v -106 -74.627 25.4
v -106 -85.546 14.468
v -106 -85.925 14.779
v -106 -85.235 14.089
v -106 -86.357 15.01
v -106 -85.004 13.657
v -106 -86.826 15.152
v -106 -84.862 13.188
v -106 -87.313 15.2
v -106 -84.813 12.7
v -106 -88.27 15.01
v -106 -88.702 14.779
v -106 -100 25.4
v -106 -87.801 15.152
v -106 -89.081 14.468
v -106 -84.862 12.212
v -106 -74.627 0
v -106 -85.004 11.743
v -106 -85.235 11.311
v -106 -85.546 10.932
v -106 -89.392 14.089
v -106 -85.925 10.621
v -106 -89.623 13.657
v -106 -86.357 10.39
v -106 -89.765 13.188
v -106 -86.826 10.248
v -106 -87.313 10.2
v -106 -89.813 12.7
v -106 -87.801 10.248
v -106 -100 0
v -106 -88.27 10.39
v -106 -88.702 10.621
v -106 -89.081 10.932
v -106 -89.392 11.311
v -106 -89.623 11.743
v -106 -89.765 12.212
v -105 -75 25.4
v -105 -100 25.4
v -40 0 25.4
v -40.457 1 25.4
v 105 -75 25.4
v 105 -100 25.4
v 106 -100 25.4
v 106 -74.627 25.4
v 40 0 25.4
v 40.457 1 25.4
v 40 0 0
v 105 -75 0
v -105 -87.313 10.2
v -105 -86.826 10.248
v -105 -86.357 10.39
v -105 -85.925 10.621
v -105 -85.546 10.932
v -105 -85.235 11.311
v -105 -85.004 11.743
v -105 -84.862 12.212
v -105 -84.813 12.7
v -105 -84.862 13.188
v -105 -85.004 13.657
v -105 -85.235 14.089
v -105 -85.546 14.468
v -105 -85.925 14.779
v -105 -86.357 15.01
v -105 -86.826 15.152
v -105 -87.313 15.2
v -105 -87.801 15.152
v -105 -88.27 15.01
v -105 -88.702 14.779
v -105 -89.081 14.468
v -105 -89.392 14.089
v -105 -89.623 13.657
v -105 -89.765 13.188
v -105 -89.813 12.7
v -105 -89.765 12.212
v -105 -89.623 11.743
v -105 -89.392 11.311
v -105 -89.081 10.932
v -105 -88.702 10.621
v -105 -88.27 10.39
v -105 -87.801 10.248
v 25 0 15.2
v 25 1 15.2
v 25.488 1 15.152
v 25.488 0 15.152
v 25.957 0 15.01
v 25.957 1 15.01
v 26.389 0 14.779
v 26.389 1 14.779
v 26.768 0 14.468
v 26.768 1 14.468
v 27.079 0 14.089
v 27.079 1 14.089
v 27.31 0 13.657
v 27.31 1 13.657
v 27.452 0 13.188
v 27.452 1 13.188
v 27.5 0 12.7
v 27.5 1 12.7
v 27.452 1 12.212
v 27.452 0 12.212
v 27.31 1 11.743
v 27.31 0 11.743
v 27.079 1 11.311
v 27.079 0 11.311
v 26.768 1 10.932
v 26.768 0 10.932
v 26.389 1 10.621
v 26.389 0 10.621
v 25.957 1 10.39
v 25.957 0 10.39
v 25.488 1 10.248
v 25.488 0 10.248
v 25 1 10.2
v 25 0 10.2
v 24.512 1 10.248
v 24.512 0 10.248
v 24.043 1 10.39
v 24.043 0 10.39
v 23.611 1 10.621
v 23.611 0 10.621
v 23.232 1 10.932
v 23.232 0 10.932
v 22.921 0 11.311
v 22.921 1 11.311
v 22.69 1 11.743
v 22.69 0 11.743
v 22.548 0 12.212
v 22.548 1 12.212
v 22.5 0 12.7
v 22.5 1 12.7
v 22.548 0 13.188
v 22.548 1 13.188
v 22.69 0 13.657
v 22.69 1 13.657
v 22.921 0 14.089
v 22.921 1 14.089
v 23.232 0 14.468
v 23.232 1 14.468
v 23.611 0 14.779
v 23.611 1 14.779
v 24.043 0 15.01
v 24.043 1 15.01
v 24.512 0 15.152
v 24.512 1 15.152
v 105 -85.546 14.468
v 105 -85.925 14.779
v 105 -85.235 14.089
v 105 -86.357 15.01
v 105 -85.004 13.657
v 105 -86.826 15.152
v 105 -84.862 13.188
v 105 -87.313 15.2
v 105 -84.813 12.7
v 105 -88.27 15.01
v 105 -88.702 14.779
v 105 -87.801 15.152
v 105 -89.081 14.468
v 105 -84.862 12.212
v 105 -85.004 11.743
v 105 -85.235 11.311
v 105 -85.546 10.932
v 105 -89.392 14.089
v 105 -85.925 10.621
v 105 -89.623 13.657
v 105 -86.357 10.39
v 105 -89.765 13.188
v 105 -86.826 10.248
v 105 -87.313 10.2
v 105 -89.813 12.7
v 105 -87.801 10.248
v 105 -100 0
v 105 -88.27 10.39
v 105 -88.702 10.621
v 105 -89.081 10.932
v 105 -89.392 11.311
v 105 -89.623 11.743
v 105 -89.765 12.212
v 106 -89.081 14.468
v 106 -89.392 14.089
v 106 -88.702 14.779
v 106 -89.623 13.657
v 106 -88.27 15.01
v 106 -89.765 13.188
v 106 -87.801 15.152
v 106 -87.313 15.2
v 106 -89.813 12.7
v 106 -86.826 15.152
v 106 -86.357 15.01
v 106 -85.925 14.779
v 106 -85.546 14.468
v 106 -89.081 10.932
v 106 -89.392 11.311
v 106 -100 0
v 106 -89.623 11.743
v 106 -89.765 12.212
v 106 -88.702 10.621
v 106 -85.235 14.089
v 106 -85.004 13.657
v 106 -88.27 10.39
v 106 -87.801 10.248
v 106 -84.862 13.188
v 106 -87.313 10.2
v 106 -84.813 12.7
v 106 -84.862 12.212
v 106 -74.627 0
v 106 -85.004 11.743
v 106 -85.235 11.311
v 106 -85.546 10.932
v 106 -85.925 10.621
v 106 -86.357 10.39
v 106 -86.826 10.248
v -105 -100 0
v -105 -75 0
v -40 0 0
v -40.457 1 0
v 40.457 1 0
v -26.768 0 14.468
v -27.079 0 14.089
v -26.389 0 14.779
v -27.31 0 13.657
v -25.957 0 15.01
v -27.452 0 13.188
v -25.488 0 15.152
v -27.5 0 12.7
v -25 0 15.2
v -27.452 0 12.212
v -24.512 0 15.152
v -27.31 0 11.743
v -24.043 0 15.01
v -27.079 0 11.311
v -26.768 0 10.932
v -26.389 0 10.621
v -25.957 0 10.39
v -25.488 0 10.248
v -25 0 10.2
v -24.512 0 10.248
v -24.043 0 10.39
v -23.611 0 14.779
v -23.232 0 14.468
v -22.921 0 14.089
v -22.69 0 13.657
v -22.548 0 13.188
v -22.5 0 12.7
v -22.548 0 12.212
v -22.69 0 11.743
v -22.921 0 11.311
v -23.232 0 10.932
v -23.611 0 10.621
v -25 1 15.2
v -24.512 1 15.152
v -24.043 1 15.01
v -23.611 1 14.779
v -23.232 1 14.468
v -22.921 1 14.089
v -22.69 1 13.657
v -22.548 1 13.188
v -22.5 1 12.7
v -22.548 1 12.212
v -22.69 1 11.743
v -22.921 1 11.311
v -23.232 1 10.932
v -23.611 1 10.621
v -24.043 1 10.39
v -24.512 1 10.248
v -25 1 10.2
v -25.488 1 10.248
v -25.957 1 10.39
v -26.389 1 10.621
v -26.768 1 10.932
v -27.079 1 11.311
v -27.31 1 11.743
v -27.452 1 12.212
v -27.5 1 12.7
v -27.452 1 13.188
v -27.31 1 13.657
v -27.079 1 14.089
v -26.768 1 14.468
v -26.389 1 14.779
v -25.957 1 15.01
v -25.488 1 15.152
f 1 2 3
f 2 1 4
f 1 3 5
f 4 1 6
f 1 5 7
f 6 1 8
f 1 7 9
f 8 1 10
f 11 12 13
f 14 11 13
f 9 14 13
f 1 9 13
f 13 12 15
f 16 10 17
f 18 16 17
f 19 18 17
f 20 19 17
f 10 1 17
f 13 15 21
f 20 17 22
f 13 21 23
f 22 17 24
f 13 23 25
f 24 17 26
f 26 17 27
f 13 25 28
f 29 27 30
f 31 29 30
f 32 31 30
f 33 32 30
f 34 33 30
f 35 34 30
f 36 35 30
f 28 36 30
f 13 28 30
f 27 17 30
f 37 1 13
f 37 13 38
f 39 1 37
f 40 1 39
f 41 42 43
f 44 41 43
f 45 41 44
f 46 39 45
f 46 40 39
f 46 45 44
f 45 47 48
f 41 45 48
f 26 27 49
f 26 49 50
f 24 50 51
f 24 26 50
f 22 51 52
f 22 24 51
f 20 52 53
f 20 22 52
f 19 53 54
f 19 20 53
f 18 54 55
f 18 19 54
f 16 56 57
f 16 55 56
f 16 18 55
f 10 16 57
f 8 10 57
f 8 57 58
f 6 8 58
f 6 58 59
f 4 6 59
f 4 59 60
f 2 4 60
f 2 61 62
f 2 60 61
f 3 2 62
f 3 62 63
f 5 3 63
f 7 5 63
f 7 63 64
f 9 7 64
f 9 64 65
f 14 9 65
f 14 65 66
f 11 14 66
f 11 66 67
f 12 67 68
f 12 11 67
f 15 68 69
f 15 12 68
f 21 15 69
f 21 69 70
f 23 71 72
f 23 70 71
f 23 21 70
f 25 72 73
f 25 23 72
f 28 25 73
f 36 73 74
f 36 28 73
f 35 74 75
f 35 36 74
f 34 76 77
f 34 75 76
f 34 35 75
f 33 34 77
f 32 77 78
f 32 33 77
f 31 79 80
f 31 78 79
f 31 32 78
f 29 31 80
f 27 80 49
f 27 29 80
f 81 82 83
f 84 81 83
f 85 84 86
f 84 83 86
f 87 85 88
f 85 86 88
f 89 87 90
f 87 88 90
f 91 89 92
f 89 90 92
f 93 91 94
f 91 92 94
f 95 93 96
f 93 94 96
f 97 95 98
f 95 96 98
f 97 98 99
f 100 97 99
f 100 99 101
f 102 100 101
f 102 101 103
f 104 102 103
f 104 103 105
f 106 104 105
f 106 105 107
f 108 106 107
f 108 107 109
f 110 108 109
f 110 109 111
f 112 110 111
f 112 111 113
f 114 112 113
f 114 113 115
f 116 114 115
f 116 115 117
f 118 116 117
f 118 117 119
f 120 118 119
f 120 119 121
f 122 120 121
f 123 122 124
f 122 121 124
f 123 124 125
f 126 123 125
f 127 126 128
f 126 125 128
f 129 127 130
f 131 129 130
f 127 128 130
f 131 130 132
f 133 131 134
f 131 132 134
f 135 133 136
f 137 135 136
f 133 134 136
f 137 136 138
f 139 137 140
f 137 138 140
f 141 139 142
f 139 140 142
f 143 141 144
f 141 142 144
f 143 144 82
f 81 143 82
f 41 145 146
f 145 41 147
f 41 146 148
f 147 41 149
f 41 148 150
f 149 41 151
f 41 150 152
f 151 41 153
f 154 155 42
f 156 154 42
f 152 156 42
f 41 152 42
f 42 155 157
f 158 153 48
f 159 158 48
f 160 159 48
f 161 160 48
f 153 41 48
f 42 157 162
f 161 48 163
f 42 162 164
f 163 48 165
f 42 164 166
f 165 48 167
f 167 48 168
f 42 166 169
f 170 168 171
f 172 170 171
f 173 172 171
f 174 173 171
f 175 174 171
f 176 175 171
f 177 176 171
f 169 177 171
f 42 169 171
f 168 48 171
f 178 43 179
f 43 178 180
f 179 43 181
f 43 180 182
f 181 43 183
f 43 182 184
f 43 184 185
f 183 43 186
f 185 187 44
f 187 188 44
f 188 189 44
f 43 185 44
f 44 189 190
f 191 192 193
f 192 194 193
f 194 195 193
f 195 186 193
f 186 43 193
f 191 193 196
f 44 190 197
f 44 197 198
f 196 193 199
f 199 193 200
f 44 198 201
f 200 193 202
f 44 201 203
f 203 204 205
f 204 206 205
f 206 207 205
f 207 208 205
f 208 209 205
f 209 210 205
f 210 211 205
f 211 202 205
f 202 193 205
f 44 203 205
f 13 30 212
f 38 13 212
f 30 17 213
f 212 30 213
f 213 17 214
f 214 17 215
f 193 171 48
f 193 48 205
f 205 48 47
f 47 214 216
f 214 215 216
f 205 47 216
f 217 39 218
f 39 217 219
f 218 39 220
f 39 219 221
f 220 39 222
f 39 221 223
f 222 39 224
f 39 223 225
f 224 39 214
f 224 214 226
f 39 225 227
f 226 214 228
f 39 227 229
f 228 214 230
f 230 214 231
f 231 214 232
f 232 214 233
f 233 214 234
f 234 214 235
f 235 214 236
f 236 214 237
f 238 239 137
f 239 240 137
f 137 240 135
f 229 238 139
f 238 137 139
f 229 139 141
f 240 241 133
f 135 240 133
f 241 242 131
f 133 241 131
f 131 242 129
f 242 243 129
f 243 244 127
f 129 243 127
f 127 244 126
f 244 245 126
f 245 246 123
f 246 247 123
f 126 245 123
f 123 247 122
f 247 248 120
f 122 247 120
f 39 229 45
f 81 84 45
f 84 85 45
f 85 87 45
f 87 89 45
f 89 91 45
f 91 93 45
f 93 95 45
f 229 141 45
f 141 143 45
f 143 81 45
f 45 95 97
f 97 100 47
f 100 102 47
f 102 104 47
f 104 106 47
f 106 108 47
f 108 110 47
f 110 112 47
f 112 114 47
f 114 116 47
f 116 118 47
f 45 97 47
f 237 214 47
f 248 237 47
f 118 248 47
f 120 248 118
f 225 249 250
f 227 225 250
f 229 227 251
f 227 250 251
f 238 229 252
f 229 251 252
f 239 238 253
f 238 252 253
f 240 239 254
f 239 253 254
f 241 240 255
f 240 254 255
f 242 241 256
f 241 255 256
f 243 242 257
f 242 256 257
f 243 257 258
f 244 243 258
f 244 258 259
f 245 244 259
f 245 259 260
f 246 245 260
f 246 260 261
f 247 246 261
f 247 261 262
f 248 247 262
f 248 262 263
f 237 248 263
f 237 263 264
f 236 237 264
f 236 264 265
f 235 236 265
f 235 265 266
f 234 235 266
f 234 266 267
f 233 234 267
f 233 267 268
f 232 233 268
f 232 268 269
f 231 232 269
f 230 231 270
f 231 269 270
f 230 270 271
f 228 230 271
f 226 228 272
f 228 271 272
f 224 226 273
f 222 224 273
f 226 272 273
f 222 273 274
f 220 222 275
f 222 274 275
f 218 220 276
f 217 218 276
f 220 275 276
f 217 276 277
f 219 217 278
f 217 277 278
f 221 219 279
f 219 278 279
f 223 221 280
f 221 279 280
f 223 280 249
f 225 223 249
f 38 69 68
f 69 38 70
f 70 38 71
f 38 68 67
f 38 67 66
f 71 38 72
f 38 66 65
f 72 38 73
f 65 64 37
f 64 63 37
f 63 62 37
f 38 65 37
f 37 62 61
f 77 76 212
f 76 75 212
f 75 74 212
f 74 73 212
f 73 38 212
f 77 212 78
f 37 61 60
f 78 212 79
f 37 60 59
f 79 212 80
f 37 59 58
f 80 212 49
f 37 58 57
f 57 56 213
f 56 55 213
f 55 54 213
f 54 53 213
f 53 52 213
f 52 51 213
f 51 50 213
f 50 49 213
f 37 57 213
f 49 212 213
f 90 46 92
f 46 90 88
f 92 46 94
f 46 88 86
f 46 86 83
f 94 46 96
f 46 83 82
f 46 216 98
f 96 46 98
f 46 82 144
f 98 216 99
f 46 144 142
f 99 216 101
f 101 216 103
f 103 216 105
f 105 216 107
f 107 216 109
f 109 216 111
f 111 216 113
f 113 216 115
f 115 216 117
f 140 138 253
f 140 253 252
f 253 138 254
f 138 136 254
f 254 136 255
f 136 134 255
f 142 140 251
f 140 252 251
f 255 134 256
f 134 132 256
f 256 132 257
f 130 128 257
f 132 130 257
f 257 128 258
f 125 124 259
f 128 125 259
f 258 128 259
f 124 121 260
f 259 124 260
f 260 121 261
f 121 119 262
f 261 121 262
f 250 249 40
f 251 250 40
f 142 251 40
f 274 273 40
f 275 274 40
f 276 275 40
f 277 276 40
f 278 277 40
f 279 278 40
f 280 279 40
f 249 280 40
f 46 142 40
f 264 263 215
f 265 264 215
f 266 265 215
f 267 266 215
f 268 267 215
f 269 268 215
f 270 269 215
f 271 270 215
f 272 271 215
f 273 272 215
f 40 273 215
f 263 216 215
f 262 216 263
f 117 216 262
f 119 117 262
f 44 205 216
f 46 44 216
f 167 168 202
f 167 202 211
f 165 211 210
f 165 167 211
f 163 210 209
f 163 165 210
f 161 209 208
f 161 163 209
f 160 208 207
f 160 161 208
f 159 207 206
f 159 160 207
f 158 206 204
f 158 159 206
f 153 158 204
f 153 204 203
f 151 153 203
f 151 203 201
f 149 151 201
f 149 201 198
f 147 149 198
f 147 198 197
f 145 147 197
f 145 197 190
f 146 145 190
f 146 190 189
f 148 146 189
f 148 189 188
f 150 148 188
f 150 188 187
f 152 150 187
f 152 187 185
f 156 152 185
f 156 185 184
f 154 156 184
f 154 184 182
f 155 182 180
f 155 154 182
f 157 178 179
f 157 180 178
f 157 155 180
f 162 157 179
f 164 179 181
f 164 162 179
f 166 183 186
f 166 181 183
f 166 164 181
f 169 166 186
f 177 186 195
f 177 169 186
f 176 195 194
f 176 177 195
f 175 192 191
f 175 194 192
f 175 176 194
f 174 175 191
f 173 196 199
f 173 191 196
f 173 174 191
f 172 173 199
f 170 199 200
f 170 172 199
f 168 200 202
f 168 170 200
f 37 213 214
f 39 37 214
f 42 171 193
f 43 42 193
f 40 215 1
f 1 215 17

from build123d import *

# Parameters (mm, degrees)
EXTRUDE_THIN1_DEPTH     = 25.4
SKETCH3_R               = 2.5
CUT_EXTRUDE1_DEPTH      = 10
CUT_EXTRUDE2_DEPTH      = 148.922817712
CUT_EXTRUDE2_DEPTH_BACK = 148.922817712
SKETCH4_R               = 2.5


with BuildPart() as part:
    # Sketch2 → Extrude-Thin1 (new body)
    with BuildSketch(Plane.XY):
        Polygon((-105, -100), (-105, -75), (-40, 0), (40, 0), (105, -75), (105, -100), (106, -100), (106, -74.626966674), (40.456628883, 1), (-40.456628883, 1), (-106, -74.626966674), (-106, -100), align=None)
    extrude(amount=EXTRUDE_THIN1_DEPTH)

    # Sketch3 → Cut-Extrude1 (cut)
    with BuildSketch(Plane(origin=(0, 1, 0), x_dir=(1, 0, 0), z_dir=(0, 1, 0))):
        with Locations(Location((-25, -12.7, 0), (0, 0, 270))):
            Circle(SKETCH3_R)
        with Locations(Location((25, -12.7, 0), (0, 0, 270))):
            Circle(SKETCH3_R)
    extrude(amount=-CUT_EXTRUDE1_DEPTH, mode=Mode.SUBTRACT)

    # Sketch4 → Cut-Extrude2 (cut, two sides: drawn at the far end of the back side and taken through both)
    with BuildSketch(Plane(origin=(0, 0, 0), x_dir=(0, 0, -1), z_dir=(1, 0, 0)).offset(-CUT_EXTRUDE2_DEPTH_BACK)):
        with Locations((-12.7, -87.313483337)):
            Circle(SKETCH4_R)
    extrude(amount=CUT_EXTRUDE2_DEPTH + CUT_EXTRUDE2_DEPTH_BACK, mode=Mode.SUBTRACT)


solid = part.part
